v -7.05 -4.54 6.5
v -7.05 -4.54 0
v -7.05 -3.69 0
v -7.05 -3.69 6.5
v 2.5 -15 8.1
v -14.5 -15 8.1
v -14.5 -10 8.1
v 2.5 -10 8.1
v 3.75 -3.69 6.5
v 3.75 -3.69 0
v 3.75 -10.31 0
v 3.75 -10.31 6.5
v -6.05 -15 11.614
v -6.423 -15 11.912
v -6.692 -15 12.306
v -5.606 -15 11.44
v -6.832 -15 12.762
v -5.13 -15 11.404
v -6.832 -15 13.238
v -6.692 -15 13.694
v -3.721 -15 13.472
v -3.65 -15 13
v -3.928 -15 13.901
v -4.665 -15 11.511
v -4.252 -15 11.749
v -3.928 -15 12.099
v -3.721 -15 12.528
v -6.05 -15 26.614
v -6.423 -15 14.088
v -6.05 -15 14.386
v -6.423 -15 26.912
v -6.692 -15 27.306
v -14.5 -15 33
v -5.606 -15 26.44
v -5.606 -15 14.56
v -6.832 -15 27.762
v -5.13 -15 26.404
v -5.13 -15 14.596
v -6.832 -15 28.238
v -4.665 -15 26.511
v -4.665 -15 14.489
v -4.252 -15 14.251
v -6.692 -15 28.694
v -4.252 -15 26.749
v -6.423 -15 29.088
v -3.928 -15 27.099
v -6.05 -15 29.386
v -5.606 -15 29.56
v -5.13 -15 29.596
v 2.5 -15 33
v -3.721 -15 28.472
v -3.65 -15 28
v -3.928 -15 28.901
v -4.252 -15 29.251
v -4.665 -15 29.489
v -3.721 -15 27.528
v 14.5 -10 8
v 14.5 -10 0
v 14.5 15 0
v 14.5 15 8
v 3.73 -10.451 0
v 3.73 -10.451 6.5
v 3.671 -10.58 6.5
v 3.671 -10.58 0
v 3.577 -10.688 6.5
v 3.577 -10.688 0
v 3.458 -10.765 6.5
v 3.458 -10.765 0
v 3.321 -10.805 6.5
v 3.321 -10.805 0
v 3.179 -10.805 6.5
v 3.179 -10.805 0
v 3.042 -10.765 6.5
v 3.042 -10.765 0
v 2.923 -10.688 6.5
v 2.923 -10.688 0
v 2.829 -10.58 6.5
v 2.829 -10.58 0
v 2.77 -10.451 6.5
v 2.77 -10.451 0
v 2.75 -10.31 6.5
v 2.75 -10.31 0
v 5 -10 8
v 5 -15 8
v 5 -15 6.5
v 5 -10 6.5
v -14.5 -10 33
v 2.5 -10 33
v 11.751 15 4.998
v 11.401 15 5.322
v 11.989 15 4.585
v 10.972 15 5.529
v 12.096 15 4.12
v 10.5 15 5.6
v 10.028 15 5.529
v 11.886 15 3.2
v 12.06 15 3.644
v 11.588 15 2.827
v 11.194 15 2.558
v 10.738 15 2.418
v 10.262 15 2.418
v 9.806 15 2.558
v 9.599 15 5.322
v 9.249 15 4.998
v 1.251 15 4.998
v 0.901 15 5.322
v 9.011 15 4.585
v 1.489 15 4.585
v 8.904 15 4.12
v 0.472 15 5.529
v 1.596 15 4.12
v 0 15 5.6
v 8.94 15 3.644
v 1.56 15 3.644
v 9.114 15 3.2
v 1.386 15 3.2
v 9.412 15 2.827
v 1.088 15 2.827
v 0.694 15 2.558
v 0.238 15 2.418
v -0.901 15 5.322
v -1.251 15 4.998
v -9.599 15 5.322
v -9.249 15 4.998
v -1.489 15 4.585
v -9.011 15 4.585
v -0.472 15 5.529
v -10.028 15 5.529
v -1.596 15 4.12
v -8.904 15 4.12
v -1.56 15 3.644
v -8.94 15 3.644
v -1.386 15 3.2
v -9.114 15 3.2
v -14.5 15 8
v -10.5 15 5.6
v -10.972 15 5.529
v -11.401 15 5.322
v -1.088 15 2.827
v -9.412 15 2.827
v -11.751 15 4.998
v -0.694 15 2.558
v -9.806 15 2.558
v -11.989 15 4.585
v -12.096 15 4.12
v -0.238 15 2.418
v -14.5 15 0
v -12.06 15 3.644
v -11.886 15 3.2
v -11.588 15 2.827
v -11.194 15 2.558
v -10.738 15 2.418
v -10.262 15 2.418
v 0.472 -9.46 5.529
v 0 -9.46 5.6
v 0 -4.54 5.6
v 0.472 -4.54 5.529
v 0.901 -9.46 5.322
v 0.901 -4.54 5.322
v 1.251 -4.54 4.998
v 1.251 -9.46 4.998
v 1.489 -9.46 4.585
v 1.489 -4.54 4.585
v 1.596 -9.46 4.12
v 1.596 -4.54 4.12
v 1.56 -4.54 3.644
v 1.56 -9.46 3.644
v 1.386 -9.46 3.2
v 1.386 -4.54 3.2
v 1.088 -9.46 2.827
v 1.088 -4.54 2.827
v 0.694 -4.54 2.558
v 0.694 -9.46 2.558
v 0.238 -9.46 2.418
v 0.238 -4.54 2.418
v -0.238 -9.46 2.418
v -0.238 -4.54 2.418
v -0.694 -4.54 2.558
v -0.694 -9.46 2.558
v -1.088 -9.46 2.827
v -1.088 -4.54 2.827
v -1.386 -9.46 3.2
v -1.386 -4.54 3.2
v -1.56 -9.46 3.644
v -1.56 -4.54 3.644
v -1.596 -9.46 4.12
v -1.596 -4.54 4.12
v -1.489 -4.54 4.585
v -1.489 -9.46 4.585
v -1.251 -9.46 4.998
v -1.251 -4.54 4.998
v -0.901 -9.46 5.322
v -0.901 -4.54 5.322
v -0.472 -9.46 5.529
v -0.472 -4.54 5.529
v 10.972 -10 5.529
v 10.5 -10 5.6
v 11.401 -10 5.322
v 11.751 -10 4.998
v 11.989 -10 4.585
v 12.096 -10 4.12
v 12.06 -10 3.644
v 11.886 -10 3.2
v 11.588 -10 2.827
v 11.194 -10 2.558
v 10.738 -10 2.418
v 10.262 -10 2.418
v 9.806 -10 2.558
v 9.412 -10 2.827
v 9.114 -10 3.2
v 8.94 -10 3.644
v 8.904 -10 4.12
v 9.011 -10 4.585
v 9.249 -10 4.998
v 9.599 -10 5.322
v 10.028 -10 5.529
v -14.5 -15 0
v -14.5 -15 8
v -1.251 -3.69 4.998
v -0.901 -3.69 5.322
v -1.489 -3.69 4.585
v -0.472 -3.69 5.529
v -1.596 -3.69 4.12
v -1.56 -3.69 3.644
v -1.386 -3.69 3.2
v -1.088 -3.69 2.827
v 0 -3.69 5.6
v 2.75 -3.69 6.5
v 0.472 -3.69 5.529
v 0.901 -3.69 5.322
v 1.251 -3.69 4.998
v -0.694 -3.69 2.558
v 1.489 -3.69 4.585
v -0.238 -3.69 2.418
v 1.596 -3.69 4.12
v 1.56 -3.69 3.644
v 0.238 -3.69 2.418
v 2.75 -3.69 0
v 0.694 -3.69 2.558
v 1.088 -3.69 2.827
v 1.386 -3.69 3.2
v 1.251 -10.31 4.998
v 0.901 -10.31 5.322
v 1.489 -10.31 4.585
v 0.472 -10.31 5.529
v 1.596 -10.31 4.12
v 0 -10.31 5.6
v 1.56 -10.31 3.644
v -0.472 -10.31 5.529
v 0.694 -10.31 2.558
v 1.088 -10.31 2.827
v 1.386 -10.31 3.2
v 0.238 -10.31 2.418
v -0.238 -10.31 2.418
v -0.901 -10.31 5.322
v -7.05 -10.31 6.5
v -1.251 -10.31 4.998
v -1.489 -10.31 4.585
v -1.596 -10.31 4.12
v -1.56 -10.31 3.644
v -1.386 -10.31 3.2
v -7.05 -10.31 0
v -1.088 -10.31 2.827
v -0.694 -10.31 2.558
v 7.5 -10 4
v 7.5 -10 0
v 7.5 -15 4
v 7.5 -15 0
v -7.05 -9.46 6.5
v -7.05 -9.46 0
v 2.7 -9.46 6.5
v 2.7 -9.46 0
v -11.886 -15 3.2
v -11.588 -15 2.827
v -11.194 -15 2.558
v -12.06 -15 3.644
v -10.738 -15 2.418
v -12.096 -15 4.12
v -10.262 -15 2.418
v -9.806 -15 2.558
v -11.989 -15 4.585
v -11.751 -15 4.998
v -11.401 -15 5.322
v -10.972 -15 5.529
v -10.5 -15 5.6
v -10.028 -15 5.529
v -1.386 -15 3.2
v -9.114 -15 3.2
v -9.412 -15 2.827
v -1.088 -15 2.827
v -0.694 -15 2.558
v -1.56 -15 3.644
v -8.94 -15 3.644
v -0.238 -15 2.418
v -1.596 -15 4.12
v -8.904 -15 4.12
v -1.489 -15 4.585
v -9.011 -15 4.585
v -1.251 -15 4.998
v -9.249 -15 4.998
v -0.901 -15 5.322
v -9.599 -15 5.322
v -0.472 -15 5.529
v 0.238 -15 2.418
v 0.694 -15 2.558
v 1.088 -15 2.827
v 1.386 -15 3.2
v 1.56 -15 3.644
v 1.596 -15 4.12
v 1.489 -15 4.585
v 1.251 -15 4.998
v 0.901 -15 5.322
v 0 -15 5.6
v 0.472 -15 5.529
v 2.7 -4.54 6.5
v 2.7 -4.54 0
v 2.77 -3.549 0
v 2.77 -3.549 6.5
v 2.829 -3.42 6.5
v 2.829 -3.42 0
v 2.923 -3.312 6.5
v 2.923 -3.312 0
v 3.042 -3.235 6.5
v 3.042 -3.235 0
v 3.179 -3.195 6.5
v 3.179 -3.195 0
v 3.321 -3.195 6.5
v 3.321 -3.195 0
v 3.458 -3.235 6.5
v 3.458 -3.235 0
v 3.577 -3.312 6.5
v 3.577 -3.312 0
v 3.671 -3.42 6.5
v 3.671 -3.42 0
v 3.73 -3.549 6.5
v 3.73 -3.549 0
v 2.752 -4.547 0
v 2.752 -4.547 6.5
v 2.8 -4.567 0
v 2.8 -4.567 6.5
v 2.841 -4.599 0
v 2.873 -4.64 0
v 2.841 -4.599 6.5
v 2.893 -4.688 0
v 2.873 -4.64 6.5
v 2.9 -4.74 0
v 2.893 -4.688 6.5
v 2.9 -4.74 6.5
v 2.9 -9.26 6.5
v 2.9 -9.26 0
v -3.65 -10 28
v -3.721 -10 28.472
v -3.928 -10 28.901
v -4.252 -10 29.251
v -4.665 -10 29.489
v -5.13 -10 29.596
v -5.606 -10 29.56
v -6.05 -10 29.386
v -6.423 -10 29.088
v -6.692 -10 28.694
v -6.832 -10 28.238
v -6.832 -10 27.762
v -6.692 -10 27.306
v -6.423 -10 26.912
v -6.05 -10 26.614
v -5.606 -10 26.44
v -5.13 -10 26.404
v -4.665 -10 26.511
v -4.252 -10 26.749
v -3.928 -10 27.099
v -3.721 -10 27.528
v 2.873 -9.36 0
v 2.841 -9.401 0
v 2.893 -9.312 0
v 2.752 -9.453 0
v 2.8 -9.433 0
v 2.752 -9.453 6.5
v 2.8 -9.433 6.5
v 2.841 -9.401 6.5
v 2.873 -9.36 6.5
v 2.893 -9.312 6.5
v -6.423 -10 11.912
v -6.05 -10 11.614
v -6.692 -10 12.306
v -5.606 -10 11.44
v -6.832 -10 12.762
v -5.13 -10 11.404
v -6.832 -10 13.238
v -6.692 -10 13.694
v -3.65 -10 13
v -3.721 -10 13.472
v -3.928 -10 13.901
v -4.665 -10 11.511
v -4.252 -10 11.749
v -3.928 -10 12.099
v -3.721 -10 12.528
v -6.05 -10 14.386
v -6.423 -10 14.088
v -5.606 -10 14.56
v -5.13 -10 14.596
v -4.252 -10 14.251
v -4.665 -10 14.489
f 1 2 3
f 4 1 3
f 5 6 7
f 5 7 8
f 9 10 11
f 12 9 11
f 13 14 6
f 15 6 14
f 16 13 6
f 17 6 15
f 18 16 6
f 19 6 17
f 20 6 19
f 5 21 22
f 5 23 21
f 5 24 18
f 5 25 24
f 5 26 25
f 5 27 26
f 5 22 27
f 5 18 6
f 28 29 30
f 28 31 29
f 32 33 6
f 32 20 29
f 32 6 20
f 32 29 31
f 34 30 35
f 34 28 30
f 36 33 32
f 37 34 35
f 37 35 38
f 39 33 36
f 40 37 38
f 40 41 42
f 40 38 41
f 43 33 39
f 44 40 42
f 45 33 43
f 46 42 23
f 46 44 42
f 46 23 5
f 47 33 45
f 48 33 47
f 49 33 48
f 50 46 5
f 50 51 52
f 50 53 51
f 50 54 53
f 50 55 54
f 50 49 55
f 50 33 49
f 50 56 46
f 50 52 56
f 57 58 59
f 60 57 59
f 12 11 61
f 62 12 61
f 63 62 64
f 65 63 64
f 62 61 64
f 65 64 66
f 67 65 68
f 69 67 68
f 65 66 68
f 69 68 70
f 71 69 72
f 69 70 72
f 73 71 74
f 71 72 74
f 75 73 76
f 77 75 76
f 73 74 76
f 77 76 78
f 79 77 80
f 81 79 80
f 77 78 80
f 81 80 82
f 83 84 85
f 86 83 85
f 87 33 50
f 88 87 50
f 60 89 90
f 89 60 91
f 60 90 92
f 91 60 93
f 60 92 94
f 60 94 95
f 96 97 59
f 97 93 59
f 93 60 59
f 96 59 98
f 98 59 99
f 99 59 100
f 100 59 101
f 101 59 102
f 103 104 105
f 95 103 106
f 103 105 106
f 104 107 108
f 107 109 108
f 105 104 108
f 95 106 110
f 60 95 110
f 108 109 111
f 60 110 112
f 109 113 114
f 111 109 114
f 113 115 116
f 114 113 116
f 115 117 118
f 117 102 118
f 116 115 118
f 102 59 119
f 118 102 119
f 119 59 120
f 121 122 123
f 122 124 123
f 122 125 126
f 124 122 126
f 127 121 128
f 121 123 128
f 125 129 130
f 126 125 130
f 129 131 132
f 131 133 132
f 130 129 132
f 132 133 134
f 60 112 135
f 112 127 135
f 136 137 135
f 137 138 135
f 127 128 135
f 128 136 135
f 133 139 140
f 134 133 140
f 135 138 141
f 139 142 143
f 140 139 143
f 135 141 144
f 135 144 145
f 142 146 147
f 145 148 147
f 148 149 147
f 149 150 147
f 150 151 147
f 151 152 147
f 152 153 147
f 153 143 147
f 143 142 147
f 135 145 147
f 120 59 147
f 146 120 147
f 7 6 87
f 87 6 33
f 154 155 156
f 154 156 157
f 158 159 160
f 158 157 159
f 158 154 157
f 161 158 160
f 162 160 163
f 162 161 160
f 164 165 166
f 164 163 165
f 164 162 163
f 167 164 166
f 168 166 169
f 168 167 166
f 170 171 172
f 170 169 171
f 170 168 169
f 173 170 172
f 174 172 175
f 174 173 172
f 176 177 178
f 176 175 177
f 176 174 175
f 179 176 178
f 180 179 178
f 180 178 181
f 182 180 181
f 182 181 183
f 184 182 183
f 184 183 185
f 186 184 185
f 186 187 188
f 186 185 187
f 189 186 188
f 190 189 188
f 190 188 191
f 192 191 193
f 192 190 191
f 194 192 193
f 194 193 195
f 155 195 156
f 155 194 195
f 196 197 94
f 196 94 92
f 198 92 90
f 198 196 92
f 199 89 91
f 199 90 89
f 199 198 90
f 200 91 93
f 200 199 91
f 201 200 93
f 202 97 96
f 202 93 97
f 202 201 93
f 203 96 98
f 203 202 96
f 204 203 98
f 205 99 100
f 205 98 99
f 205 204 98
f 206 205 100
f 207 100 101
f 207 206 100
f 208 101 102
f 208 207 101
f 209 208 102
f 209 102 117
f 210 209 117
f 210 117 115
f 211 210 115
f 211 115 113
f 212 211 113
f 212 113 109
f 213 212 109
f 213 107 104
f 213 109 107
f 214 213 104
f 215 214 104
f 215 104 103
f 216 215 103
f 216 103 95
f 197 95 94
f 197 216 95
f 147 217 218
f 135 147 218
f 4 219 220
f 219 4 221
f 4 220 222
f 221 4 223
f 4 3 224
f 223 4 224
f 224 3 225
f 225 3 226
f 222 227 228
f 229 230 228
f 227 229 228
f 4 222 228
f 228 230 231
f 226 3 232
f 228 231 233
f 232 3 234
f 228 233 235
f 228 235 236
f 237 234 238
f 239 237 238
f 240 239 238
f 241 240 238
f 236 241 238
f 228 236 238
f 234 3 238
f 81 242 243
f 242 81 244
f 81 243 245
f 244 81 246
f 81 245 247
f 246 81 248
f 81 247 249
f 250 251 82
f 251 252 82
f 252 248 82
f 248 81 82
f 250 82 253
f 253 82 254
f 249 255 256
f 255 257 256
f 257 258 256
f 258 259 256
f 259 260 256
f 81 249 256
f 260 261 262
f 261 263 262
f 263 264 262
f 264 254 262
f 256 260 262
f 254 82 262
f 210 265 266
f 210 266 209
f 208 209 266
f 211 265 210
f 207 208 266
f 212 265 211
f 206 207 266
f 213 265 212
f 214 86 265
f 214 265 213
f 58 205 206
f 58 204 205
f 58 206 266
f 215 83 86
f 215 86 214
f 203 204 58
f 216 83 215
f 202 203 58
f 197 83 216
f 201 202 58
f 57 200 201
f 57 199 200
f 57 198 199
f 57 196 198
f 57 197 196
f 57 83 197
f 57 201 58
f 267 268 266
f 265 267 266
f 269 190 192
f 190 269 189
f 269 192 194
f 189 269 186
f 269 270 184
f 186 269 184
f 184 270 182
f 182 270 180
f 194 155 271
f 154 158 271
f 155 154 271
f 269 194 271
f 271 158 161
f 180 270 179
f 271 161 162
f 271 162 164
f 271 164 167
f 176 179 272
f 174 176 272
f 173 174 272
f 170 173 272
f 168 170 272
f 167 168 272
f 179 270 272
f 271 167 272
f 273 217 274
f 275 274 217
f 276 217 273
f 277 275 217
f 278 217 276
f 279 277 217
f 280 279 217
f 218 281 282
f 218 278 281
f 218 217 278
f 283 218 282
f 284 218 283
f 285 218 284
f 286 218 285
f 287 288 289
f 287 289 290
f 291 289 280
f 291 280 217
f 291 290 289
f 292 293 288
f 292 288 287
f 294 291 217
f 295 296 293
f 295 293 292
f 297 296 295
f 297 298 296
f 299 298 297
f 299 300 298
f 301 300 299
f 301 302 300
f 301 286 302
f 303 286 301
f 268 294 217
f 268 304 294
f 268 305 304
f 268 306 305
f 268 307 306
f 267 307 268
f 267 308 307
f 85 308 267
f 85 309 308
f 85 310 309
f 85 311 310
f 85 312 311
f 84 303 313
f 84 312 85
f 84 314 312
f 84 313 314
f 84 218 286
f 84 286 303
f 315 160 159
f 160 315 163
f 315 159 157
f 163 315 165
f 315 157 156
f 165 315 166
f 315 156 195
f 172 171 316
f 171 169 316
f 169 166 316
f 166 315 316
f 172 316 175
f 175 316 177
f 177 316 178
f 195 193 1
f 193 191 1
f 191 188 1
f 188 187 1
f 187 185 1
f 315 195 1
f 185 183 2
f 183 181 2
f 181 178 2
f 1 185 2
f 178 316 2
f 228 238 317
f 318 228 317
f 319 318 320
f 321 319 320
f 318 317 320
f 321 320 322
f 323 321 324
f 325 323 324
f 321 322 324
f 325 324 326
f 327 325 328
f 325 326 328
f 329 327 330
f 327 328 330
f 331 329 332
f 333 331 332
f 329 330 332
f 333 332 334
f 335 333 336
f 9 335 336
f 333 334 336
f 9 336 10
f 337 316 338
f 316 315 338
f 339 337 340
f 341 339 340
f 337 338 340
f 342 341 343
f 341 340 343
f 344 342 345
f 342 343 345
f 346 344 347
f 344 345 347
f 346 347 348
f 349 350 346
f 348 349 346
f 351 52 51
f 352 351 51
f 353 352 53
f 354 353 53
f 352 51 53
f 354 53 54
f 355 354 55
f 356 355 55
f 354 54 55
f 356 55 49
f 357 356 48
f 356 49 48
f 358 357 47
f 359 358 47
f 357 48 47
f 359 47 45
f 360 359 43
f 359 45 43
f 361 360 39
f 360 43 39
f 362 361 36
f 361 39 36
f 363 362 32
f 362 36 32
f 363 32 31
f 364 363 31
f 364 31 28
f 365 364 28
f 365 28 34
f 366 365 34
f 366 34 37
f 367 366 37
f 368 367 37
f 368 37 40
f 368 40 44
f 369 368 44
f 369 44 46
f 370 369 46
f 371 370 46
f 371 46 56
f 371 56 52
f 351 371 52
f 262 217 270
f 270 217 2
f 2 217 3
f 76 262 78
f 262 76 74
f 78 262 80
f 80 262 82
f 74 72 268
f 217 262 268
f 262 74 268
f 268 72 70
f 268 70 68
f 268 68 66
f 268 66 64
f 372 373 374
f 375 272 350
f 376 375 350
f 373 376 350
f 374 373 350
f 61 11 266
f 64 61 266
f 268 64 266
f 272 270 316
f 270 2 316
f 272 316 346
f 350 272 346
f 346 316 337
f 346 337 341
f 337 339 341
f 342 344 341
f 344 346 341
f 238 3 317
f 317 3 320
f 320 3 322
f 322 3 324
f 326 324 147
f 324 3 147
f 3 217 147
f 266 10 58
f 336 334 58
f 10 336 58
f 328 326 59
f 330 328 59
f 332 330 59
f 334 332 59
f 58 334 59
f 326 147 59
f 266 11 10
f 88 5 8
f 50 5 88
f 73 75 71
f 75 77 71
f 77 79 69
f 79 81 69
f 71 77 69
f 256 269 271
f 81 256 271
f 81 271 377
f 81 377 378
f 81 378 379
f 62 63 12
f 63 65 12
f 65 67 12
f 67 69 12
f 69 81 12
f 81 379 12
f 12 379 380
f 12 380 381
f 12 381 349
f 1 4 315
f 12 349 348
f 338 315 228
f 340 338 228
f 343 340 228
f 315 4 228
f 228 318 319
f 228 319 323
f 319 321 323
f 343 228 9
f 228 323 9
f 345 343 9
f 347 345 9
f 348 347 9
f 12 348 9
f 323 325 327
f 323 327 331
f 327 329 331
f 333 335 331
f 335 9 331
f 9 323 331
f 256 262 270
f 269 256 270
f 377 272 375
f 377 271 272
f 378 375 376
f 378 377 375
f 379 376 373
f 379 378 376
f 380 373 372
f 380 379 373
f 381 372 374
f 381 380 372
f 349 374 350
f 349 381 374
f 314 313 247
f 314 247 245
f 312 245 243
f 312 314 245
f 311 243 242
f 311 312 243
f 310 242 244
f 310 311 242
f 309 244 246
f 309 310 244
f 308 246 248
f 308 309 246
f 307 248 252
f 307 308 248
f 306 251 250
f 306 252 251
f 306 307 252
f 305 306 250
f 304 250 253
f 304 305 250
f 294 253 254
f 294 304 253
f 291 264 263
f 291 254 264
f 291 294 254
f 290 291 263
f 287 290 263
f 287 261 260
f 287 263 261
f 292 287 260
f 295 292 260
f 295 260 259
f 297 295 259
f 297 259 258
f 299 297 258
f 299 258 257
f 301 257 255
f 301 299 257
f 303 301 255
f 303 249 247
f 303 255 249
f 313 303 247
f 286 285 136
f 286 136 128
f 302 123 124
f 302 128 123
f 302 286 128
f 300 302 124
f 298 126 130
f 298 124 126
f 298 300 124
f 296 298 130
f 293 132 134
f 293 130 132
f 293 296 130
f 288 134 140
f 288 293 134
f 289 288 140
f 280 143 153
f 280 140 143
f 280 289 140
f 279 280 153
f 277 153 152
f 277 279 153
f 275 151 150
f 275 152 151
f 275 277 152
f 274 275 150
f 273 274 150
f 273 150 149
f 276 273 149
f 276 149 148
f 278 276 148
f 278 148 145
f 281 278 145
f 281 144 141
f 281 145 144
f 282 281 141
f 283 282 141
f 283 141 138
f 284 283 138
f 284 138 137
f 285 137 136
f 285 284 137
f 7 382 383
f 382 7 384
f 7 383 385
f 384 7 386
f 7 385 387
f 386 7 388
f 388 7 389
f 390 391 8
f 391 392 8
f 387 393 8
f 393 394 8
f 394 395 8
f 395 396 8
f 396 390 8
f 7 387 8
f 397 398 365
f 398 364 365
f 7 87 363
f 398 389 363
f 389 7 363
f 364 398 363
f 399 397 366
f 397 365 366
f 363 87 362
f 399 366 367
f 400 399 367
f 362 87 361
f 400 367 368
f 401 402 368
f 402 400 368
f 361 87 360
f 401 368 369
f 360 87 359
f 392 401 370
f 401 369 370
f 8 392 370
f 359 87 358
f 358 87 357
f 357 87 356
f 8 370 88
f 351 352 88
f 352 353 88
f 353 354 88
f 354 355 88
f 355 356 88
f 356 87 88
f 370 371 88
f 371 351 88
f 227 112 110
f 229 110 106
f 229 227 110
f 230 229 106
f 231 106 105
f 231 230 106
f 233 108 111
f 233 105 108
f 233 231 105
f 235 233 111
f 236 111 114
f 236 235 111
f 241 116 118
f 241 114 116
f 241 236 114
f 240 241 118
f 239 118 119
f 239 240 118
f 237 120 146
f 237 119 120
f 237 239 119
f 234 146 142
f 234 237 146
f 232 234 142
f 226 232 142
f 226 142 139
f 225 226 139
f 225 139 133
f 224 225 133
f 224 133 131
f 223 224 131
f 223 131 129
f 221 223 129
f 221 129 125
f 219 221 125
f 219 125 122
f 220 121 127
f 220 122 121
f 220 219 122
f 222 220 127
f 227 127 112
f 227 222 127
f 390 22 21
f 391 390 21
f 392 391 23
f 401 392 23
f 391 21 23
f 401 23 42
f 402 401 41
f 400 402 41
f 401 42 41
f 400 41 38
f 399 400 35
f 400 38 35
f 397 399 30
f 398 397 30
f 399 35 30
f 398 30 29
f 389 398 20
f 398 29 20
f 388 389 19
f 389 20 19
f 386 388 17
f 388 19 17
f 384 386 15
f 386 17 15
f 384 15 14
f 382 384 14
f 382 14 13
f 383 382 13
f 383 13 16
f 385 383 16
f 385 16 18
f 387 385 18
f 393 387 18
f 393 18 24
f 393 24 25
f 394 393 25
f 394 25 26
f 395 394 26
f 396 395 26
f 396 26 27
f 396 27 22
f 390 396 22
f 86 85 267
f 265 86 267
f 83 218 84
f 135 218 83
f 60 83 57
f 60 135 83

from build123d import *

# Parameters (mm, degrees)
EXTRUDE_1_DEPTH          = 8
CUT_EXTRUDE_1_DEPTH      = 35.267331381
CUT_EXTRUDE_1_DEPTH_BACK = 35.267331381
SKETCH_3_R               = 1.6
EXTRUDE_2_REACH          = 36.267
SKETCH_5_W               = 17
SKETCH_5_H               = 25
SKETCH_8_W               = 20
SKETCH_8_H               = 13.304516949
EXTRUDE_4_DEPTH          = 1.5
CUT_EXTRUDE_4_DEPTH      = 5
SKETCH_10_R              = 1.6
SKETCH_10_W              = 17
SKETCH_10_H              = 0.1
CUT_EXTRUDE_5_DEPTH      = 10
FILLET_1_R               = 0.2


with BuildPart() as part:
    # 草图2 → 凸台-拉伸1 (new body)
    with BuildSketch(Plane.XY):
        Polygon((14.5, 15), (-14.5, 15), (-14.5, -15), (7.5, -15), (7.5, -10), (14.5, -10), align=None)
        with BuildLine():
            Line((2.9, -9.46), (2.9, -4.54))
            Line((2.9, -4.54), (-7.05, -4.54))
            Line((-7.05, -4.54), (-7.05, -3.69))
            Line((-7.05, -3.69), (2.75, -3.69))
            ThreePointArc((2.75, -3.69), (3.25, -3.19), (3.75, -3.69))
            Line((3.75, -3.69), (3.75, -10.31))
            ThreePointArc((3.75, -10.31), (3.25, -10.81), (2.75, -10.31))
            Line((2.75, -10.31), (-7.05, -10.31))
            Line((-7.05, -10.31), (-7.05, -9.46))
            Line((-7.05, -9.46), (2.9, -9.46))
        make_face(mode=Mode.SUBTRACT)
    extrude(amount=EXTRUDE_1_DEPTH)

    # 草图3 → 切除-拉伸1 (cut, two sides: drawn at the far end of the back side and taken through both)
    with BuildSketch(Plane(origin=(0, 15, 0), x_dir=(1, 0, 0), z_dir=(0, 1, 0)).offset(-CUT_EXTRUDE_1_DEPTH_BACK)):
        with Locations(Location((0, -4, 0), (0, 0, 270))):
            Circle(SKETCH_3_R)
        with Locations(Location((10.5, -4, 0), (0, 0, 270))):
            Circle(SKETCH_3_R)
        with Locations(Location((-10.5, -4, 0), (0, 0, 270))):
            Circle(SKETCH_3_R)
    extrude(amount=CUT_EXTRUDE_1_DEPTH + CUT_EXTRUDE_1_DEPTH_BACK, mode=Mode.SUBTRACT)

    # 凸台-拉伸2: up to this face of the body (flat: up to its plane)
    extrude_2_end = Plane(part.part.faces().sort_by_distance((7.606301458, -10, 4))[0])
    # 草图5 → 凸台-拉伸2 (add, up to the picked face)
    with BuildSketch(Plane.XZ.offset(15), mode=Mode.PRIVATE) as extrude_2_sk1:
        with Locations((-6, 20.5)):
            Rectangle(SKETCH_5_W, SKETCH_5_H)
    extrude_2_tool1 = split(extrude(extrude_2_sk1.sketch, amount=-EXTRUDE_2_REACH, mode=Mode.PRIVATE), bisect_by=extrude_2_end, keep=Keep.BOTH, mode=Mode.PRIVATE)
    add(extrude_2_tool1.solids().sort_by(Axis((-6, -15, 20.5), (0, 1, 0)))[0])

    # 草图8 → 凸台-拉伸4 (add)
    with BuildSketch(Plane.XY.offset(8)):
        with Locations((-2.5, -8.347741526)):
            Rectangle(SKETCH_8_W, SKETCH_8_H)
    extrude(amount=-EXTRUDE_4_DEPTH)

    # 草图9 → 切除-拉伸4 (cut)
    with BuildSketch(Plane.XZ.offset(15)):
        Polygon((5, 6.5), (7.5, 4), (7.5, 8), (5, 8), align=None)
    extrude(amount=-CUT_EXTRUDE_4_DEPTH, mode=Mode.SUBTRACT)

    # 草图10 → 切除-拉伸5 (cut)
    with BuildSketch(Plane.XZ.offset(15)):
        with Locations((-5.25, 13)):
            Circle(SKETCH_10_R)
        with Locations((-5.25, 28)):
            Circle(SKETCH_10_R)
        with Locations((-6, 8.05)):
            Rectangle(SKETCH_10_W, SKETCH_10_H)
    extrude(amount=-CUT_EXTRUDE_5_DEPTH, mode=Mode.SUBTRACT)


with BuildPart() as cut_extrude_5_piece_1:
    # of the separate pieces the step leaves, piece 1, a body of its own (cut_extrude_5_pieces)
    add(part.part.solids().sort_by_distance((-14.5, -15, 0))[0])

    # 圆角1
    fillet_1_edges = [cut_extrude_5_piece_1.edges().sort_by_distance(p)[0] for p in [
        (2.9, -9.46, 3.25),
        (2.9, -4.54, 3.25),
    ]]
    fillet(fillet_1_edges, radius=FILLET_1_R)


with BuildPart() as cut_extrude_5_piece_2:
    # of the separate pieces the step leaves, piece 2, a body of its own (cut_extrude_5_pieces)
    add(part.part.solids().sort_by_distance((-14.5, -15, 8.1))[0])


solid = Compound([cut_extrude_5_piece_1.part, cut_extrude_5_piece_2.part])
